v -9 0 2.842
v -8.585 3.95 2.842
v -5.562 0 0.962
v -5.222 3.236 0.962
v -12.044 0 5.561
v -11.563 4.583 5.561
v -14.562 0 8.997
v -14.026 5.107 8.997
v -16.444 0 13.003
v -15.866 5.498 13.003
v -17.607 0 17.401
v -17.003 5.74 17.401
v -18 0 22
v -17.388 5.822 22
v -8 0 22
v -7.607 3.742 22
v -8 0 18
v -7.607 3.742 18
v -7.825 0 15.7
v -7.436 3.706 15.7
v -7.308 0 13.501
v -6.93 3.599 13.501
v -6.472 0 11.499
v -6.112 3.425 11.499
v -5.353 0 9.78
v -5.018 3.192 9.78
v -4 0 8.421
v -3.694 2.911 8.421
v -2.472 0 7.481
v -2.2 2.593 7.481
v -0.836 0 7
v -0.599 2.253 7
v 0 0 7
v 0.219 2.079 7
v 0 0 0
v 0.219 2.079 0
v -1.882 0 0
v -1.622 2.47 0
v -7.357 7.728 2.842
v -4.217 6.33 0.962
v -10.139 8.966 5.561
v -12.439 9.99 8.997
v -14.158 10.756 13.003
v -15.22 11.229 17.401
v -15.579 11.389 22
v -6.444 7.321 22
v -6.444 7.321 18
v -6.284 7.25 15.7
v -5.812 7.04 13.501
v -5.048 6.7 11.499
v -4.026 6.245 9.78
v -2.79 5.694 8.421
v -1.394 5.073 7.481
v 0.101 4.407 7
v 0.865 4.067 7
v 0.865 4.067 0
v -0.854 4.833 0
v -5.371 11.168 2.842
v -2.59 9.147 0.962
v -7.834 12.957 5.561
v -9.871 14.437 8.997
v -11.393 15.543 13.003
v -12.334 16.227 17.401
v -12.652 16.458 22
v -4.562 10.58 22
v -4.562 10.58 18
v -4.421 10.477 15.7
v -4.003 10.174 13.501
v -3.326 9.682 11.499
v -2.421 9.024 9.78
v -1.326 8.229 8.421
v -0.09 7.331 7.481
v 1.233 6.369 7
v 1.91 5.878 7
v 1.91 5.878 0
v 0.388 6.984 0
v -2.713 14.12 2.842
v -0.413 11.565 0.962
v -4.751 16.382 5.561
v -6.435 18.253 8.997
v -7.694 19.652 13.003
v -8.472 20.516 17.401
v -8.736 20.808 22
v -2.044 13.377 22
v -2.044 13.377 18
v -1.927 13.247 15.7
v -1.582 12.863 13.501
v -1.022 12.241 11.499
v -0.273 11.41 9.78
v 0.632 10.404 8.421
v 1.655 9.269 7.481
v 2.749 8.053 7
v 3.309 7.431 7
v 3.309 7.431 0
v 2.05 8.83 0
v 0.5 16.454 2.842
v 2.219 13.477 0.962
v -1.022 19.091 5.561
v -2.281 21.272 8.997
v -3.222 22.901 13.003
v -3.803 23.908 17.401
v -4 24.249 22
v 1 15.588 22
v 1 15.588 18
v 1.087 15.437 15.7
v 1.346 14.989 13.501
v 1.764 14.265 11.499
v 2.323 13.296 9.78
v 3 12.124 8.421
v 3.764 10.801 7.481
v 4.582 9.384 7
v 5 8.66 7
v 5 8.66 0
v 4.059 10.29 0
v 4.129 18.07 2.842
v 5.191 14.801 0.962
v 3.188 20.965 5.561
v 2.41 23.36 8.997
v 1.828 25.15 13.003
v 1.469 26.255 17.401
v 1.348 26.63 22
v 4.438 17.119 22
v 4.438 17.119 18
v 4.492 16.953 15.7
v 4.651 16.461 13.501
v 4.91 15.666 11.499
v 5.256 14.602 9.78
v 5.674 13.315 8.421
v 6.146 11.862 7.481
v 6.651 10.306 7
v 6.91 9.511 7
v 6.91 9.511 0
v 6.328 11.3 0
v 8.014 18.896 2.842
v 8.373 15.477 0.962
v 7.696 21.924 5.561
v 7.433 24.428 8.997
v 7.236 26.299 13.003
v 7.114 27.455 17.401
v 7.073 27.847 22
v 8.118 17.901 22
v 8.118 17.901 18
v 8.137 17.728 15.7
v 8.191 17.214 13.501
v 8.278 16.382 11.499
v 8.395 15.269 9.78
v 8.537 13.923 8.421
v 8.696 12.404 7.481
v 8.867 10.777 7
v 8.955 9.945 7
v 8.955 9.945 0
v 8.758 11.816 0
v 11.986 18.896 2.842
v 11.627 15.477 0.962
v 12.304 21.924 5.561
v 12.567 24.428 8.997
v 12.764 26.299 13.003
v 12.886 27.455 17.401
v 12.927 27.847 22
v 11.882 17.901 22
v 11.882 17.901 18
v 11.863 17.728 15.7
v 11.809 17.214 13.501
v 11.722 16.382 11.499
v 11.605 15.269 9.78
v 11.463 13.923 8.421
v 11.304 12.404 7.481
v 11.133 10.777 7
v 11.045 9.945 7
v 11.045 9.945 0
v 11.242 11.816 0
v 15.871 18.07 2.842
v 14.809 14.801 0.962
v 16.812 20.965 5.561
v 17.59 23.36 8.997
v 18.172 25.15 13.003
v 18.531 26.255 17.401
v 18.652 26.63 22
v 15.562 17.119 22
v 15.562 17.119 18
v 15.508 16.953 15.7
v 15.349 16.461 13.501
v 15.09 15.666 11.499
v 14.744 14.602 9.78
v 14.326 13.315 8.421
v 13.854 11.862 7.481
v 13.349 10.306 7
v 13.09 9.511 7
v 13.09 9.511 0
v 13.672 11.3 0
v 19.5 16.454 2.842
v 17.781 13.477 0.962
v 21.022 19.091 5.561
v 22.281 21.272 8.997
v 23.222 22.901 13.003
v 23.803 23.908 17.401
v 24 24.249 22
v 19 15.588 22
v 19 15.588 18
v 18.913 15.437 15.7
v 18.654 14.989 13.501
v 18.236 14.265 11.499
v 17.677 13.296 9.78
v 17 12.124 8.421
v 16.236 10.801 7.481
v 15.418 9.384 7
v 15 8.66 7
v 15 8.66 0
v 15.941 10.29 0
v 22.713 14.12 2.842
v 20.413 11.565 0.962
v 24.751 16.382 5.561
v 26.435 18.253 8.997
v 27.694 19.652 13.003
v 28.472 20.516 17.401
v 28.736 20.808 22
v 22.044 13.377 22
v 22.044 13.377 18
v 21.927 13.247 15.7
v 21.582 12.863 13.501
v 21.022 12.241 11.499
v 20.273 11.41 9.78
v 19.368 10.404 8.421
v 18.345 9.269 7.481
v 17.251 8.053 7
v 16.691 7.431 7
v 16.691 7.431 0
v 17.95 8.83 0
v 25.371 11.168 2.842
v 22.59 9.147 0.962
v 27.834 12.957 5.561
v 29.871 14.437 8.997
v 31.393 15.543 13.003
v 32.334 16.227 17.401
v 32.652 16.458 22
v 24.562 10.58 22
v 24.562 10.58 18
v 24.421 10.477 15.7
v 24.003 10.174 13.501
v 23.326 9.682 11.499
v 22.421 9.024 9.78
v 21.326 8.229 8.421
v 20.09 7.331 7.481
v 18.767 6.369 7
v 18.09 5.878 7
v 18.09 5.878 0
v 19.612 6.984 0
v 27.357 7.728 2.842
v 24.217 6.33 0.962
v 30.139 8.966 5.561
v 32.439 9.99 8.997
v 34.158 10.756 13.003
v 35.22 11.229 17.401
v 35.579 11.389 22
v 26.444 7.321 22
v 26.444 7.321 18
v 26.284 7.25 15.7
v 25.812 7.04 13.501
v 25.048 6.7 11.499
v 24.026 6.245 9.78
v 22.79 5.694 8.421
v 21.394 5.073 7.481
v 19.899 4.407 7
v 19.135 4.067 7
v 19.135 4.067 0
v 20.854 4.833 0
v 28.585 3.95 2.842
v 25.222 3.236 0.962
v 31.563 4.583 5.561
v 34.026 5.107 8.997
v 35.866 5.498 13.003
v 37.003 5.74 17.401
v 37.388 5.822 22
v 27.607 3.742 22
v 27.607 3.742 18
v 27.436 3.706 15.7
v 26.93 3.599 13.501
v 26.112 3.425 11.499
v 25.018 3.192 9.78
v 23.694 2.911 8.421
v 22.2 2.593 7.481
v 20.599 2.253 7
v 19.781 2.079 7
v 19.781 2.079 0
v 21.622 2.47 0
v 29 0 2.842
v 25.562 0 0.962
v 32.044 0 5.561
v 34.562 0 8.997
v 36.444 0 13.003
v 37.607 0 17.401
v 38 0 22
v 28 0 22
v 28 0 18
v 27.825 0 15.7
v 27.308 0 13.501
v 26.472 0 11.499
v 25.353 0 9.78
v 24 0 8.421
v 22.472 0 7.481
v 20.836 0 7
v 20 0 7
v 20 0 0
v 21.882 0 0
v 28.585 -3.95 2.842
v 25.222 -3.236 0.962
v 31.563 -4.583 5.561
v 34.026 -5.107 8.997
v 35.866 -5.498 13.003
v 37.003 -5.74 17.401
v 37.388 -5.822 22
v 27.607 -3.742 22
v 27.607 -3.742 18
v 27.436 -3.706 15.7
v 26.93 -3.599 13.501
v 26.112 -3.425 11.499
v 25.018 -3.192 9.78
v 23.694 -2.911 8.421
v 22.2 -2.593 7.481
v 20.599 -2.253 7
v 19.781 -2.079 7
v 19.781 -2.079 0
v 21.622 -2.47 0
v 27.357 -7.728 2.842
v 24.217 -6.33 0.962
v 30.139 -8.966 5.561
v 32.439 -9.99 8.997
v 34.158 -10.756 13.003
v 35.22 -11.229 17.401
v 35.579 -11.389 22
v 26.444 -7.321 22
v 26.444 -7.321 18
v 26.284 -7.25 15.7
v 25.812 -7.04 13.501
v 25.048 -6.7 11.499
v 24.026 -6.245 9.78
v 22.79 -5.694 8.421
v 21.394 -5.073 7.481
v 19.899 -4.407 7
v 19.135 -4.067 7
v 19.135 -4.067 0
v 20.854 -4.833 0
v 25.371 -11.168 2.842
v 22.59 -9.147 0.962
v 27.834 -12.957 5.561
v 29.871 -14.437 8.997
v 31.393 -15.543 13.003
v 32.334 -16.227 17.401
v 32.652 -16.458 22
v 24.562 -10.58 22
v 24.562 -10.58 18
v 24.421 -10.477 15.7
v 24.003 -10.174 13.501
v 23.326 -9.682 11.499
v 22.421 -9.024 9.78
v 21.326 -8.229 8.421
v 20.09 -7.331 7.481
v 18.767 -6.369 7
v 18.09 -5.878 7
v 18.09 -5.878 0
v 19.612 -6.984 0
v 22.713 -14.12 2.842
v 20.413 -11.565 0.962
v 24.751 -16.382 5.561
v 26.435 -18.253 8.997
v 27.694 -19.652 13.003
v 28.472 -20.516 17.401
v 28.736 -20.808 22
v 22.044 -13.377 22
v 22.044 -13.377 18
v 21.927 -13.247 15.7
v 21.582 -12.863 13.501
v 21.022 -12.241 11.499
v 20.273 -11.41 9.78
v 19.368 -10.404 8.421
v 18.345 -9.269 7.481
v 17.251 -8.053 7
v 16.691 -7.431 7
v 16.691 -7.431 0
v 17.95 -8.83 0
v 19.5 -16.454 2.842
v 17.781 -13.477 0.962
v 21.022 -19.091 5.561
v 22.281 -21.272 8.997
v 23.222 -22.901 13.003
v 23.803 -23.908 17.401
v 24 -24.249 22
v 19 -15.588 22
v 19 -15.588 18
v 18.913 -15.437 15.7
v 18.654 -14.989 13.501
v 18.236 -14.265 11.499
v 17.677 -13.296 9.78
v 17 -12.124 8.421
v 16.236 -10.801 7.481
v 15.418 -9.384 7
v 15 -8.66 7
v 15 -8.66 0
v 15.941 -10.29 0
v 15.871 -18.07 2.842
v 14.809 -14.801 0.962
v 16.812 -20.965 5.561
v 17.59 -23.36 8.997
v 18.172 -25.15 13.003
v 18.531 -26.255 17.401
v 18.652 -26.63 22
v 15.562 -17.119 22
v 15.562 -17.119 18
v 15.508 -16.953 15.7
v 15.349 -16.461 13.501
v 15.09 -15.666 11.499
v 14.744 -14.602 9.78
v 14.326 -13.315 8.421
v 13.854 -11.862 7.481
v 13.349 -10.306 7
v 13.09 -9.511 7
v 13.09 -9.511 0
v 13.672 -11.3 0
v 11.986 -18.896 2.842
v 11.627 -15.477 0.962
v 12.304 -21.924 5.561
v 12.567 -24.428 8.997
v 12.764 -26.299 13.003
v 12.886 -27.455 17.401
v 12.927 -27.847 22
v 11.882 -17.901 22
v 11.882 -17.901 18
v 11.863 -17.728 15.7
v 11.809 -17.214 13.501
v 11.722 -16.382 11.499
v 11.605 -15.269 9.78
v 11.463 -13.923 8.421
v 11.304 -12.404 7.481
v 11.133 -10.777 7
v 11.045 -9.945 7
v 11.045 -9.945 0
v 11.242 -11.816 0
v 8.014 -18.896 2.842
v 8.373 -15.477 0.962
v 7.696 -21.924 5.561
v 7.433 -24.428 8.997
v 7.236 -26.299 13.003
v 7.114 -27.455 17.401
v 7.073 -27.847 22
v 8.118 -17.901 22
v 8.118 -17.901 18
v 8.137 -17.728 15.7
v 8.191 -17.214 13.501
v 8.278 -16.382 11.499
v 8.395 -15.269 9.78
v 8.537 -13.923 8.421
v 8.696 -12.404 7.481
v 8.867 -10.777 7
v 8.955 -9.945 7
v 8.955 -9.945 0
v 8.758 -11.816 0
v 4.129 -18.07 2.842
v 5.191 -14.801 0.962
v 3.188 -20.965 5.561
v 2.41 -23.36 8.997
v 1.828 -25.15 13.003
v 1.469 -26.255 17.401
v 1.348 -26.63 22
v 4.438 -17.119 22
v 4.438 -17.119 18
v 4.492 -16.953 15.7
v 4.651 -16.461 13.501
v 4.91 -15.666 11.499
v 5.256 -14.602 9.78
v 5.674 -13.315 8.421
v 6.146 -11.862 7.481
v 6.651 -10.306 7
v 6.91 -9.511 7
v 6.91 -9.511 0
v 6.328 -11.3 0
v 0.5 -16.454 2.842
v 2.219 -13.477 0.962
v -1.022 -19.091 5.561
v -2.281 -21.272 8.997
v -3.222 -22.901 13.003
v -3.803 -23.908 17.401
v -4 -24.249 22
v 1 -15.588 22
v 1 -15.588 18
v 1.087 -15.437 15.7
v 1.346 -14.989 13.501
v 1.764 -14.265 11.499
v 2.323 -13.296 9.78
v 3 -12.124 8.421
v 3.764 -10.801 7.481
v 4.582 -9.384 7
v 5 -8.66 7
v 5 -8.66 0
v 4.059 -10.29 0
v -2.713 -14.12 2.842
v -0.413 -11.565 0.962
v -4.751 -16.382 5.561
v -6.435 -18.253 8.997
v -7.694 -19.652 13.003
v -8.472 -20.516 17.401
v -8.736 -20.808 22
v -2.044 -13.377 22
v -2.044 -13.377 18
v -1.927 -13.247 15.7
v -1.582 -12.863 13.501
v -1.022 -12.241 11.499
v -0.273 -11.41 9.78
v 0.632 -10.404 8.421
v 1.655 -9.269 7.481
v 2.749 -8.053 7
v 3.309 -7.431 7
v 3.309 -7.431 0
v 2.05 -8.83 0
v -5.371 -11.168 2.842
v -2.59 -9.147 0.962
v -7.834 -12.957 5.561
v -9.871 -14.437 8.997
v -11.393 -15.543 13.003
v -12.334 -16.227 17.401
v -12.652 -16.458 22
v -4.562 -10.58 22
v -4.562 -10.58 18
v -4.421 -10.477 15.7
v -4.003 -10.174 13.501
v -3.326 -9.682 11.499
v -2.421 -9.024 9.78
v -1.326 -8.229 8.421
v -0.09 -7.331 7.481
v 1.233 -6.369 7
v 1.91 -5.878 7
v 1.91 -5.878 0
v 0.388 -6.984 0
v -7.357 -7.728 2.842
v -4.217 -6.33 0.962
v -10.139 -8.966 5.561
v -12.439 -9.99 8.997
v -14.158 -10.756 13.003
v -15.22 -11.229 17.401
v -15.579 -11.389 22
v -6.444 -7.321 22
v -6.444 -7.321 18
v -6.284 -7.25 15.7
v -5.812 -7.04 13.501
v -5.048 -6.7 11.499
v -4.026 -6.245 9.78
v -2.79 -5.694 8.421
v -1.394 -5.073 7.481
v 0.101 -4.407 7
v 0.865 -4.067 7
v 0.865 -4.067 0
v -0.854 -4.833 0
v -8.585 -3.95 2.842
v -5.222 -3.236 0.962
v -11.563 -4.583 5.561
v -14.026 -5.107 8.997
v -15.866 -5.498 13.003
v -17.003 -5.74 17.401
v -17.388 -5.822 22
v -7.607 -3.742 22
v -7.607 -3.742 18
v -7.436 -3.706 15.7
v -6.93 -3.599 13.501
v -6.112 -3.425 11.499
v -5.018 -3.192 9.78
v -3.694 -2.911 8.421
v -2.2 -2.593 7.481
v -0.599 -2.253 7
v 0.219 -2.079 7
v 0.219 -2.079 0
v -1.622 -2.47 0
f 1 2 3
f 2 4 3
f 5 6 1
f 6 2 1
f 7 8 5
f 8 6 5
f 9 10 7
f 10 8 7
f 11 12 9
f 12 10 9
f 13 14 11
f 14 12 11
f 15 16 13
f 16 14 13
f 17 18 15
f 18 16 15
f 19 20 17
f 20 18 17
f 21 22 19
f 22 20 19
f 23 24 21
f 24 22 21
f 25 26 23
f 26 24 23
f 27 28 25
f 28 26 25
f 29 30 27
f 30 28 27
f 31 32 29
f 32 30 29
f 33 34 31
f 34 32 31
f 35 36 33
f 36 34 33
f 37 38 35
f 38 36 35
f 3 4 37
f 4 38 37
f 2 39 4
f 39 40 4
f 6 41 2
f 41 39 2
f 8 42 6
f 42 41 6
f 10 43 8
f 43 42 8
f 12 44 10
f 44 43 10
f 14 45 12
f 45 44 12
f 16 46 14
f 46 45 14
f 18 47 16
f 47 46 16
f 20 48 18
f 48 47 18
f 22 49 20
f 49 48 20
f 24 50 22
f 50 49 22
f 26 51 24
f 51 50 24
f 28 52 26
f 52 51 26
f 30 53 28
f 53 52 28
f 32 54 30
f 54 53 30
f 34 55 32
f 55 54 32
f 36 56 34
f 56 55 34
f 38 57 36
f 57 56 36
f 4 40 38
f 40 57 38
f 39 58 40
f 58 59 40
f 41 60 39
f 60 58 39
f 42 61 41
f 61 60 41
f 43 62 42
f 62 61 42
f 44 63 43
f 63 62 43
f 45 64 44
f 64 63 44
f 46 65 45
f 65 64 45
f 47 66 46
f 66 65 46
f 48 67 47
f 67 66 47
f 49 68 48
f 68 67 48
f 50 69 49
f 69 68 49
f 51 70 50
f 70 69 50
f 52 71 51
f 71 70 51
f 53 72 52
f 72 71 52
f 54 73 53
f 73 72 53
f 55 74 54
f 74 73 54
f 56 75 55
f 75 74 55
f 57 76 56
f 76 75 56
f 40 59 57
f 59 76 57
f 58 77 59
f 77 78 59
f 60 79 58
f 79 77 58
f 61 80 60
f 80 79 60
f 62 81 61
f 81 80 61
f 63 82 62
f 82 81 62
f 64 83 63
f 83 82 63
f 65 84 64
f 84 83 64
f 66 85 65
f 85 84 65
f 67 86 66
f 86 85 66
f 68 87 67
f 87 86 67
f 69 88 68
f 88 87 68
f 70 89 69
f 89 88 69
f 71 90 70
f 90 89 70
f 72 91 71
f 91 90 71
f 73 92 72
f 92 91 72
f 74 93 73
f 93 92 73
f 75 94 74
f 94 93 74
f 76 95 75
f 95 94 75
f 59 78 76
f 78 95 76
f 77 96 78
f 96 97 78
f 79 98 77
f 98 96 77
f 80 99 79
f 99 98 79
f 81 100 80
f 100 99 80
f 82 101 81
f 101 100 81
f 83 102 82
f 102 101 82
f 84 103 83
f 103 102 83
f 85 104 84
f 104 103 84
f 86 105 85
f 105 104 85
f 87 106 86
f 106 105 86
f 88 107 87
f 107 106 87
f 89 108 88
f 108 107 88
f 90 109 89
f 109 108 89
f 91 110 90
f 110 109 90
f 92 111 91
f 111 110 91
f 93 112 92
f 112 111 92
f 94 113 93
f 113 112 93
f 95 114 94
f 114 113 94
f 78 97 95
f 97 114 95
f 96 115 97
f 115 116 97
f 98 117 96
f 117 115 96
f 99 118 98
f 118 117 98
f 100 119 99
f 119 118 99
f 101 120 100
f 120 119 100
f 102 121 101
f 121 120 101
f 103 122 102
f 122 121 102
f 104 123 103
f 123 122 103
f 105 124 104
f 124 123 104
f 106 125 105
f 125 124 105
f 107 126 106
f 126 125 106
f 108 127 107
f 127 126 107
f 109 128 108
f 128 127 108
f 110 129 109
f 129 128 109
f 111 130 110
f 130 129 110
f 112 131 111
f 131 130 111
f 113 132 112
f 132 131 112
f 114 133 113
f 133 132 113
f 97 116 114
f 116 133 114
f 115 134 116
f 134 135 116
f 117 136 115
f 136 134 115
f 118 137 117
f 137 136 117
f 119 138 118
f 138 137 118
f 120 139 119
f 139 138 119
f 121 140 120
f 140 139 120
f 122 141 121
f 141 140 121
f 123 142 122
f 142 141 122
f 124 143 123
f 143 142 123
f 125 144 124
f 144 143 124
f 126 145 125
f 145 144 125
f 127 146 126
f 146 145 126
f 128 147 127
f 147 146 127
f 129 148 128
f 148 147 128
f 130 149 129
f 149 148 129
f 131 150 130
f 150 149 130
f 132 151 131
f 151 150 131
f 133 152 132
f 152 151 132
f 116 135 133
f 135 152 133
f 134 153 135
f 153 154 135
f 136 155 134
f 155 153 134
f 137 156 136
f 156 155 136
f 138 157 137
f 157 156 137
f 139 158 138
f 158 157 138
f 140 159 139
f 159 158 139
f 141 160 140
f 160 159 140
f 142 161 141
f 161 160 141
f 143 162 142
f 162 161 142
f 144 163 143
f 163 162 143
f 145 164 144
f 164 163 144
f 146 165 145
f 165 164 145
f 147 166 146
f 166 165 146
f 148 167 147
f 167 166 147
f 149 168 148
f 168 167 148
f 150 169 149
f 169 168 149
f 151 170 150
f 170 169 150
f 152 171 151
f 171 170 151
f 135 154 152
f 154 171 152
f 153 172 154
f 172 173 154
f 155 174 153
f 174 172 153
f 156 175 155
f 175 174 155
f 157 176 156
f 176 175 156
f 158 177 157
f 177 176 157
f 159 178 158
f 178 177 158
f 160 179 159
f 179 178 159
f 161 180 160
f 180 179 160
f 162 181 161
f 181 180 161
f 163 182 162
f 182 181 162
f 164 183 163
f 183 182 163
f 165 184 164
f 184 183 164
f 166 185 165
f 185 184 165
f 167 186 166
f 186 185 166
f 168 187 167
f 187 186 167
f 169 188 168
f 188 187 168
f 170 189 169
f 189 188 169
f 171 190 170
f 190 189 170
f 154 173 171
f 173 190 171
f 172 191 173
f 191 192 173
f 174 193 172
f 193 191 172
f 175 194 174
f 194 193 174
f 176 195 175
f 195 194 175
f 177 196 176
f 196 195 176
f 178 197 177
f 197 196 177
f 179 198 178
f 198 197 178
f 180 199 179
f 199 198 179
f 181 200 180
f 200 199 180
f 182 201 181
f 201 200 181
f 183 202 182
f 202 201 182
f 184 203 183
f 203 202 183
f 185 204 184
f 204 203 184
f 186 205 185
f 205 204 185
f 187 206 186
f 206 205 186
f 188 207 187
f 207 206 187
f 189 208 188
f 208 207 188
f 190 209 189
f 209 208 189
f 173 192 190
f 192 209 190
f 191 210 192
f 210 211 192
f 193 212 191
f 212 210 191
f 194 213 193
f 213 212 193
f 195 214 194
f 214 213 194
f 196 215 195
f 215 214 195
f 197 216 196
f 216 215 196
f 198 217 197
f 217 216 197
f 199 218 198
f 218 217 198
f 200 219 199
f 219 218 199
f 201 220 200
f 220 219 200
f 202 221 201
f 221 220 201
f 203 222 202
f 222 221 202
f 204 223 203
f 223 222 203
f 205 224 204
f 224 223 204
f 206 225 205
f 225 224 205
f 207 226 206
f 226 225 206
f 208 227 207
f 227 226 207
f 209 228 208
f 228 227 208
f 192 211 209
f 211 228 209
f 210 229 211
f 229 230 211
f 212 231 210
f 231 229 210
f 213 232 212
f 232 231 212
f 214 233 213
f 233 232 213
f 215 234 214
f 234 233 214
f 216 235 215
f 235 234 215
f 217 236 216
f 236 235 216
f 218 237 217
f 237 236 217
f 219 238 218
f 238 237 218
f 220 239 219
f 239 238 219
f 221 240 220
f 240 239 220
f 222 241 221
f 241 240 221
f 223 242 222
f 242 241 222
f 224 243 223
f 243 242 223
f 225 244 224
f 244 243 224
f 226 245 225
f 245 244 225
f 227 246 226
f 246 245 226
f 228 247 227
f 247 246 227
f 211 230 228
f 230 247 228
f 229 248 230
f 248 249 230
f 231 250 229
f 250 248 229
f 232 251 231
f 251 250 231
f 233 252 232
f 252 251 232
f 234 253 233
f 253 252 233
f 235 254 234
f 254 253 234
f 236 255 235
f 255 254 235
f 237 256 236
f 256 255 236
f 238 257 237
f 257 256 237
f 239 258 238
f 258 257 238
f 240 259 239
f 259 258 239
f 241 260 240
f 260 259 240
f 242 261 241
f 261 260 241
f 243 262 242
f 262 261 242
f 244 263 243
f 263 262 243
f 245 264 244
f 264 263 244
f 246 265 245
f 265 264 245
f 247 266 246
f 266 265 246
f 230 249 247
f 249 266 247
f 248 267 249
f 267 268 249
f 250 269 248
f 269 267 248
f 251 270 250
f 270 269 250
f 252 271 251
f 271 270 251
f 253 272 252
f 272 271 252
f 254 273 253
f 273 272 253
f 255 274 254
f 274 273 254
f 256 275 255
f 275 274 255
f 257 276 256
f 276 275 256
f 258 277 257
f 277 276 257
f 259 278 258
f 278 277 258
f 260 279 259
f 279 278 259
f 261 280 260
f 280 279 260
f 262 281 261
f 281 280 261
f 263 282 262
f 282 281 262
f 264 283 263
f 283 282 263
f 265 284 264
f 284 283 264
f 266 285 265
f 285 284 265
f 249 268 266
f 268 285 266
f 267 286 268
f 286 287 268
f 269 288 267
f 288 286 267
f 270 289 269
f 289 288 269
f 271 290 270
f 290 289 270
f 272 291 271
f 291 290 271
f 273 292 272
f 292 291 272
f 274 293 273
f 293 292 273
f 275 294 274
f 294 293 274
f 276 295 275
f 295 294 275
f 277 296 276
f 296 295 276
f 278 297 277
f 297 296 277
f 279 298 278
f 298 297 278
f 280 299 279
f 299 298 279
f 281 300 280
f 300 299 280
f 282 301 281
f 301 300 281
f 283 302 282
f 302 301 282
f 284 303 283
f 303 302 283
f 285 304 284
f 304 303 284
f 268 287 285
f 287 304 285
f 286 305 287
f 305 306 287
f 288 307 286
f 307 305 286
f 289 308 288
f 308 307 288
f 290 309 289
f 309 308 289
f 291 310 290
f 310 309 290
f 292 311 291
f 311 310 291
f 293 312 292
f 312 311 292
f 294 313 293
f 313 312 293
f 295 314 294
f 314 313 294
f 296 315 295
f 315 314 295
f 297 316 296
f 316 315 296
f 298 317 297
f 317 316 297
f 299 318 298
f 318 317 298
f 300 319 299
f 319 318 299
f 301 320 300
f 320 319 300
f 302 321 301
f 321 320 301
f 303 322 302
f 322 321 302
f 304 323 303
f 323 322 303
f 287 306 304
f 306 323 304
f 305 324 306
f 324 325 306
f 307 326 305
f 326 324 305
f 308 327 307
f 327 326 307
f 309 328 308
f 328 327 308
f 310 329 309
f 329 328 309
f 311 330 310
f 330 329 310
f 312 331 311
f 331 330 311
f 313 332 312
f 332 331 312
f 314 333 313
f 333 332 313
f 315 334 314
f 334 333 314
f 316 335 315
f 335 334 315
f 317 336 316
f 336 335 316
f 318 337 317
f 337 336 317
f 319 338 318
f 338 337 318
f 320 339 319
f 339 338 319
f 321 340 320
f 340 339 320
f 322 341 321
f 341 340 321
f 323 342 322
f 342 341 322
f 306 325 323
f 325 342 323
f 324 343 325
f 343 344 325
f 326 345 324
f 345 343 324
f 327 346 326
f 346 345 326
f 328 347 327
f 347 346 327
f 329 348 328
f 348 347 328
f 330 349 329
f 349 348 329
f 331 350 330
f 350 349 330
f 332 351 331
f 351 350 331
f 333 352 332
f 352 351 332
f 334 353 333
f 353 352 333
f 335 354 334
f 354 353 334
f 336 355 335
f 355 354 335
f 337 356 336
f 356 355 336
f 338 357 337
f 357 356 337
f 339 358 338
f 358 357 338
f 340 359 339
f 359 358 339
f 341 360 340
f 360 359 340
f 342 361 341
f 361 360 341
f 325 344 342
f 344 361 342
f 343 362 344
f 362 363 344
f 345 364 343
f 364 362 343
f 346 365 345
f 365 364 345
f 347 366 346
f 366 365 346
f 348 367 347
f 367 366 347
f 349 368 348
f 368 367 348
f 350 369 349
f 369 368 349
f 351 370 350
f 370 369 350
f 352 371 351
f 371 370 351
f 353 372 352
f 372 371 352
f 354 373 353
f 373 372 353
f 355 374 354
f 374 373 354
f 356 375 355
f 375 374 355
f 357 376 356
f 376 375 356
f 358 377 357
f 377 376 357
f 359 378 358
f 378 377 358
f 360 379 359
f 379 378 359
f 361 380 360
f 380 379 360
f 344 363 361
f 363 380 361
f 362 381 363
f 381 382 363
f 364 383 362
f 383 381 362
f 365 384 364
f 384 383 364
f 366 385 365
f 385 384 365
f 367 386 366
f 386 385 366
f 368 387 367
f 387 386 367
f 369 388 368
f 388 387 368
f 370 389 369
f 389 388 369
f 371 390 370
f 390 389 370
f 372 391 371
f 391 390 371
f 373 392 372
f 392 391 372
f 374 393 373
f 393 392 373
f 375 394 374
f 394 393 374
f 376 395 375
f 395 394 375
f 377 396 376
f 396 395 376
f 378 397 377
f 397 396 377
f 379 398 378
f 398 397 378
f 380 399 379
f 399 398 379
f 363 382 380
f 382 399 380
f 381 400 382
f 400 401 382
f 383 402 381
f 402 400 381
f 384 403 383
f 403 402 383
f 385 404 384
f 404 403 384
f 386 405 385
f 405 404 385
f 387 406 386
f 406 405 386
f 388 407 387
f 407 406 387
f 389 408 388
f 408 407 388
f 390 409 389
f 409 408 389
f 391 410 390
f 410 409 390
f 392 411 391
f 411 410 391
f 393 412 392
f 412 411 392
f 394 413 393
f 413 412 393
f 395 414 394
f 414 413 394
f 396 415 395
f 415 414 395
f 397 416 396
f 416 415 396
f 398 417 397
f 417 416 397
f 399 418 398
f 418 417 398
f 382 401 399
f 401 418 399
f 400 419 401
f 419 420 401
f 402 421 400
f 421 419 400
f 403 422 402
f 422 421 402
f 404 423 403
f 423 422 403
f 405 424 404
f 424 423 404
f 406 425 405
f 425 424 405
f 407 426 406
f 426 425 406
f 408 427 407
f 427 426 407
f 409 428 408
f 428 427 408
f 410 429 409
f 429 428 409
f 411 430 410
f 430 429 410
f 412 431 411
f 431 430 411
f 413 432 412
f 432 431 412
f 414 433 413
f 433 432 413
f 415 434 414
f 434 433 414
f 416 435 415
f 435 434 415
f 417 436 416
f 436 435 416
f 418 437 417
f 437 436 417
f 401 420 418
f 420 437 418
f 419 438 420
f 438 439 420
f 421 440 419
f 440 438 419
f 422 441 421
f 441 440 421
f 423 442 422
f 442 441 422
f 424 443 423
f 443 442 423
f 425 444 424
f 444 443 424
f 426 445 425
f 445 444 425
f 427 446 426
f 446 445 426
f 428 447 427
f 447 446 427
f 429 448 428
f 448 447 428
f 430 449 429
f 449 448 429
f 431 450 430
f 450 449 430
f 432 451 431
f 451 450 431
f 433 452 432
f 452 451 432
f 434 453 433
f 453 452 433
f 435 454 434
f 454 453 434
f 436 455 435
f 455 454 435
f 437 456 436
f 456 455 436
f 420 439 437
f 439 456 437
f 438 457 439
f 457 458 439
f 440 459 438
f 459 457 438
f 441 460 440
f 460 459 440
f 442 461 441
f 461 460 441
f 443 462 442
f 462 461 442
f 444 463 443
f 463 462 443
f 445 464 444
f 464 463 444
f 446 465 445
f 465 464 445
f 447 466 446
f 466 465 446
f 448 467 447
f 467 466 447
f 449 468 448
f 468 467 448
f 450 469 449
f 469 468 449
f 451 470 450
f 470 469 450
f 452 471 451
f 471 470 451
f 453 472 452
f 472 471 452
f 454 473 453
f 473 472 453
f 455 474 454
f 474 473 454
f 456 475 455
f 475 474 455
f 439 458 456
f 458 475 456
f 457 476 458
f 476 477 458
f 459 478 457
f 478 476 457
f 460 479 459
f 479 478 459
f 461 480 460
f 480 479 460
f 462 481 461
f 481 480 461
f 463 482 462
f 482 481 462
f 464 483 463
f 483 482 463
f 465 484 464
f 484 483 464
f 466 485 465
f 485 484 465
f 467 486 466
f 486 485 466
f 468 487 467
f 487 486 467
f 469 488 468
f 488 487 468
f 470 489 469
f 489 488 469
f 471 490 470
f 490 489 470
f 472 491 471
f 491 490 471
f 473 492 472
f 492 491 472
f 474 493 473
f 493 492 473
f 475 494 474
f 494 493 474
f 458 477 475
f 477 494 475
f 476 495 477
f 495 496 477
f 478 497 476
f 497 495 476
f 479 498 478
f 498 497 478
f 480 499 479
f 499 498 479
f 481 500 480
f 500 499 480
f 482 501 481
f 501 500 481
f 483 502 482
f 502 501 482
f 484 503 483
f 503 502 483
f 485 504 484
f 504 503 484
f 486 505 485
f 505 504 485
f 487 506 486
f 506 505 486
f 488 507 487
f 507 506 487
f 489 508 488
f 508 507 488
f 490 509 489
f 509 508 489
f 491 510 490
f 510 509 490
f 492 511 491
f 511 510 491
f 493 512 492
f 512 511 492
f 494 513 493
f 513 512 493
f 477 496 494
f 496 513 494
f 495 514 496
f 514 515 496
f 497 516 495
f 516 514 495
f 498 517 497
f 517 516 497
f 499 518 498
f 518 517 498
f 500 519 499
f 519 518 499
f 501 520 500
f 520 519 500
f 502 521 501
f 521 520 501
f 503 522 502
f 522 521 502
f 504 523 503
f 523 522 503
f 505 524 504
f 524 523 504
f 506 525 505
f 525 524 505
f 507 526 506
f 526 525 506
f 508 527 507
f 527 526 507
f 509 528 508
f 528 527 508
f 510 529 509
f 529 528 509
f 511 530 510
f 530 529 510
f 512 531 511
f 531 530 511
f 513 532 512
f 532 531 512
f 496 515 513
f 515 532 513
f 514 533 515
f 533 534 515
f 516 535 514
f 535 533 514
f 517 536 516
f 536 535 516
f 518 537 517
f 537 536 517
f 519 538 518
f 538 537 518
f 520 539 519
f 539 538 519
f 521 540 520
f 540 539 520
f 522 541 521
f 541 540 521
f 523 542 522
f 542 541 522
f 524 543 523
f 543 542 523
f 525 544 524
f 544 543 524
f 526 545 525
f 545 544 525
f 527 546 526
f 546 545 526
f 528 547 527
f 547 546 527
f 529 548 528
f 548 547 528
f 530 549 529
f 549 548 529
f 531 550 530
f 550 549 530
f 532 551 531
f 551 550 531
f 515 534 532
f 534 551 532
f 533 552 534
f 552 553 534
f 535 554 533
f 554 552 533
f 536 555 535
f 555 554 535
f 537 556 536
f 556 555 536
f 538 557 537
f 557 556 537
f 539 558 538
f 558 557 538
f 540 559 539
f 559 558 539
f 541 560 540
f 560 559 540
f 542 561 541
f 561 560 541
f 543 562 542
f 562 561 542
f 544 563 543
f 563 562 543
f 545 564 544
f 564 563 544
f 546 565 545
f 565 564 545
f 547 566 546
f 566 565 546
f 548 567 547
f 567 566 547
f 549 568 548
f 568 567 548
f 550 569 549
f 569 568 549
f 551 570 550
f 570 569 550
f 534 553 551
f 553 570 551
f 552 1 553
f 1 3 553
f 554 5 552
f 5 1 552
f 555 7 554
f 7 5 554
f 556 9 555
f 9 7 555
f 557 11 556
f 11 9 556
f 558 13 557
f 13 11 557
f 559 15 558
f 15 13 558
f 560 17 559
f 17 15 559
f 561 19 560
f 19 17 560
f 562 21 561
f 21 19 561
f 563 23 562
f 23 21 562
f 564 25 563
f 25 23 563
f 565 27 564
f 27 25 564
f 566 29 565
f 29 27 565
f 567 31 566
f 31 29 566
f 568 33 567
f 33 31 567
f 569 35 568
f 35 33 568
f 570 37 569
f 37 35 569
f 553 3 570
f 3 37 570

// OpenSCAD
// file: global_variables.scad
core_radius=10;
core_thickness=7;
core_center_bump_height=1.5;
// main file
include <global_variables.scad>;
body_radius=28;
body_width=22;
rim_thickness=10;
rim_depth=4;

module body_profile() {
    module base() {
        intersection() {
            translate([core_radius, body_width, 0]) resize([ (body_radius-core_radius)*2 ,body_width*2, 0]) circle(100);
            translate([core_radius, 0, 0]) square([body_radius-core_radius, body_width]);
        }
    }
    module inner_curve() {
        translate([core_radius, body_width-rim_depth]) resize([(body_radius-rim_thickness-core_radius)*2, (body_width-core_thickness-rim_depth)*2, 0]) circle(100);
        translate([body_radius-rim_thickness*2,body_width-rim_depth,0]) square([rim_thickness, rim_depth]); 
    }
    module core() {
        square( [core_radius, core_thickness]);
    }
    difference() {
        base();
        inner_curve();
        core();
    }
}
module body() {
    rotate_extrude() body_profile();
}
//translate([0, 0, 0]) body_profile();
translate([10, 0, 0]) body();
